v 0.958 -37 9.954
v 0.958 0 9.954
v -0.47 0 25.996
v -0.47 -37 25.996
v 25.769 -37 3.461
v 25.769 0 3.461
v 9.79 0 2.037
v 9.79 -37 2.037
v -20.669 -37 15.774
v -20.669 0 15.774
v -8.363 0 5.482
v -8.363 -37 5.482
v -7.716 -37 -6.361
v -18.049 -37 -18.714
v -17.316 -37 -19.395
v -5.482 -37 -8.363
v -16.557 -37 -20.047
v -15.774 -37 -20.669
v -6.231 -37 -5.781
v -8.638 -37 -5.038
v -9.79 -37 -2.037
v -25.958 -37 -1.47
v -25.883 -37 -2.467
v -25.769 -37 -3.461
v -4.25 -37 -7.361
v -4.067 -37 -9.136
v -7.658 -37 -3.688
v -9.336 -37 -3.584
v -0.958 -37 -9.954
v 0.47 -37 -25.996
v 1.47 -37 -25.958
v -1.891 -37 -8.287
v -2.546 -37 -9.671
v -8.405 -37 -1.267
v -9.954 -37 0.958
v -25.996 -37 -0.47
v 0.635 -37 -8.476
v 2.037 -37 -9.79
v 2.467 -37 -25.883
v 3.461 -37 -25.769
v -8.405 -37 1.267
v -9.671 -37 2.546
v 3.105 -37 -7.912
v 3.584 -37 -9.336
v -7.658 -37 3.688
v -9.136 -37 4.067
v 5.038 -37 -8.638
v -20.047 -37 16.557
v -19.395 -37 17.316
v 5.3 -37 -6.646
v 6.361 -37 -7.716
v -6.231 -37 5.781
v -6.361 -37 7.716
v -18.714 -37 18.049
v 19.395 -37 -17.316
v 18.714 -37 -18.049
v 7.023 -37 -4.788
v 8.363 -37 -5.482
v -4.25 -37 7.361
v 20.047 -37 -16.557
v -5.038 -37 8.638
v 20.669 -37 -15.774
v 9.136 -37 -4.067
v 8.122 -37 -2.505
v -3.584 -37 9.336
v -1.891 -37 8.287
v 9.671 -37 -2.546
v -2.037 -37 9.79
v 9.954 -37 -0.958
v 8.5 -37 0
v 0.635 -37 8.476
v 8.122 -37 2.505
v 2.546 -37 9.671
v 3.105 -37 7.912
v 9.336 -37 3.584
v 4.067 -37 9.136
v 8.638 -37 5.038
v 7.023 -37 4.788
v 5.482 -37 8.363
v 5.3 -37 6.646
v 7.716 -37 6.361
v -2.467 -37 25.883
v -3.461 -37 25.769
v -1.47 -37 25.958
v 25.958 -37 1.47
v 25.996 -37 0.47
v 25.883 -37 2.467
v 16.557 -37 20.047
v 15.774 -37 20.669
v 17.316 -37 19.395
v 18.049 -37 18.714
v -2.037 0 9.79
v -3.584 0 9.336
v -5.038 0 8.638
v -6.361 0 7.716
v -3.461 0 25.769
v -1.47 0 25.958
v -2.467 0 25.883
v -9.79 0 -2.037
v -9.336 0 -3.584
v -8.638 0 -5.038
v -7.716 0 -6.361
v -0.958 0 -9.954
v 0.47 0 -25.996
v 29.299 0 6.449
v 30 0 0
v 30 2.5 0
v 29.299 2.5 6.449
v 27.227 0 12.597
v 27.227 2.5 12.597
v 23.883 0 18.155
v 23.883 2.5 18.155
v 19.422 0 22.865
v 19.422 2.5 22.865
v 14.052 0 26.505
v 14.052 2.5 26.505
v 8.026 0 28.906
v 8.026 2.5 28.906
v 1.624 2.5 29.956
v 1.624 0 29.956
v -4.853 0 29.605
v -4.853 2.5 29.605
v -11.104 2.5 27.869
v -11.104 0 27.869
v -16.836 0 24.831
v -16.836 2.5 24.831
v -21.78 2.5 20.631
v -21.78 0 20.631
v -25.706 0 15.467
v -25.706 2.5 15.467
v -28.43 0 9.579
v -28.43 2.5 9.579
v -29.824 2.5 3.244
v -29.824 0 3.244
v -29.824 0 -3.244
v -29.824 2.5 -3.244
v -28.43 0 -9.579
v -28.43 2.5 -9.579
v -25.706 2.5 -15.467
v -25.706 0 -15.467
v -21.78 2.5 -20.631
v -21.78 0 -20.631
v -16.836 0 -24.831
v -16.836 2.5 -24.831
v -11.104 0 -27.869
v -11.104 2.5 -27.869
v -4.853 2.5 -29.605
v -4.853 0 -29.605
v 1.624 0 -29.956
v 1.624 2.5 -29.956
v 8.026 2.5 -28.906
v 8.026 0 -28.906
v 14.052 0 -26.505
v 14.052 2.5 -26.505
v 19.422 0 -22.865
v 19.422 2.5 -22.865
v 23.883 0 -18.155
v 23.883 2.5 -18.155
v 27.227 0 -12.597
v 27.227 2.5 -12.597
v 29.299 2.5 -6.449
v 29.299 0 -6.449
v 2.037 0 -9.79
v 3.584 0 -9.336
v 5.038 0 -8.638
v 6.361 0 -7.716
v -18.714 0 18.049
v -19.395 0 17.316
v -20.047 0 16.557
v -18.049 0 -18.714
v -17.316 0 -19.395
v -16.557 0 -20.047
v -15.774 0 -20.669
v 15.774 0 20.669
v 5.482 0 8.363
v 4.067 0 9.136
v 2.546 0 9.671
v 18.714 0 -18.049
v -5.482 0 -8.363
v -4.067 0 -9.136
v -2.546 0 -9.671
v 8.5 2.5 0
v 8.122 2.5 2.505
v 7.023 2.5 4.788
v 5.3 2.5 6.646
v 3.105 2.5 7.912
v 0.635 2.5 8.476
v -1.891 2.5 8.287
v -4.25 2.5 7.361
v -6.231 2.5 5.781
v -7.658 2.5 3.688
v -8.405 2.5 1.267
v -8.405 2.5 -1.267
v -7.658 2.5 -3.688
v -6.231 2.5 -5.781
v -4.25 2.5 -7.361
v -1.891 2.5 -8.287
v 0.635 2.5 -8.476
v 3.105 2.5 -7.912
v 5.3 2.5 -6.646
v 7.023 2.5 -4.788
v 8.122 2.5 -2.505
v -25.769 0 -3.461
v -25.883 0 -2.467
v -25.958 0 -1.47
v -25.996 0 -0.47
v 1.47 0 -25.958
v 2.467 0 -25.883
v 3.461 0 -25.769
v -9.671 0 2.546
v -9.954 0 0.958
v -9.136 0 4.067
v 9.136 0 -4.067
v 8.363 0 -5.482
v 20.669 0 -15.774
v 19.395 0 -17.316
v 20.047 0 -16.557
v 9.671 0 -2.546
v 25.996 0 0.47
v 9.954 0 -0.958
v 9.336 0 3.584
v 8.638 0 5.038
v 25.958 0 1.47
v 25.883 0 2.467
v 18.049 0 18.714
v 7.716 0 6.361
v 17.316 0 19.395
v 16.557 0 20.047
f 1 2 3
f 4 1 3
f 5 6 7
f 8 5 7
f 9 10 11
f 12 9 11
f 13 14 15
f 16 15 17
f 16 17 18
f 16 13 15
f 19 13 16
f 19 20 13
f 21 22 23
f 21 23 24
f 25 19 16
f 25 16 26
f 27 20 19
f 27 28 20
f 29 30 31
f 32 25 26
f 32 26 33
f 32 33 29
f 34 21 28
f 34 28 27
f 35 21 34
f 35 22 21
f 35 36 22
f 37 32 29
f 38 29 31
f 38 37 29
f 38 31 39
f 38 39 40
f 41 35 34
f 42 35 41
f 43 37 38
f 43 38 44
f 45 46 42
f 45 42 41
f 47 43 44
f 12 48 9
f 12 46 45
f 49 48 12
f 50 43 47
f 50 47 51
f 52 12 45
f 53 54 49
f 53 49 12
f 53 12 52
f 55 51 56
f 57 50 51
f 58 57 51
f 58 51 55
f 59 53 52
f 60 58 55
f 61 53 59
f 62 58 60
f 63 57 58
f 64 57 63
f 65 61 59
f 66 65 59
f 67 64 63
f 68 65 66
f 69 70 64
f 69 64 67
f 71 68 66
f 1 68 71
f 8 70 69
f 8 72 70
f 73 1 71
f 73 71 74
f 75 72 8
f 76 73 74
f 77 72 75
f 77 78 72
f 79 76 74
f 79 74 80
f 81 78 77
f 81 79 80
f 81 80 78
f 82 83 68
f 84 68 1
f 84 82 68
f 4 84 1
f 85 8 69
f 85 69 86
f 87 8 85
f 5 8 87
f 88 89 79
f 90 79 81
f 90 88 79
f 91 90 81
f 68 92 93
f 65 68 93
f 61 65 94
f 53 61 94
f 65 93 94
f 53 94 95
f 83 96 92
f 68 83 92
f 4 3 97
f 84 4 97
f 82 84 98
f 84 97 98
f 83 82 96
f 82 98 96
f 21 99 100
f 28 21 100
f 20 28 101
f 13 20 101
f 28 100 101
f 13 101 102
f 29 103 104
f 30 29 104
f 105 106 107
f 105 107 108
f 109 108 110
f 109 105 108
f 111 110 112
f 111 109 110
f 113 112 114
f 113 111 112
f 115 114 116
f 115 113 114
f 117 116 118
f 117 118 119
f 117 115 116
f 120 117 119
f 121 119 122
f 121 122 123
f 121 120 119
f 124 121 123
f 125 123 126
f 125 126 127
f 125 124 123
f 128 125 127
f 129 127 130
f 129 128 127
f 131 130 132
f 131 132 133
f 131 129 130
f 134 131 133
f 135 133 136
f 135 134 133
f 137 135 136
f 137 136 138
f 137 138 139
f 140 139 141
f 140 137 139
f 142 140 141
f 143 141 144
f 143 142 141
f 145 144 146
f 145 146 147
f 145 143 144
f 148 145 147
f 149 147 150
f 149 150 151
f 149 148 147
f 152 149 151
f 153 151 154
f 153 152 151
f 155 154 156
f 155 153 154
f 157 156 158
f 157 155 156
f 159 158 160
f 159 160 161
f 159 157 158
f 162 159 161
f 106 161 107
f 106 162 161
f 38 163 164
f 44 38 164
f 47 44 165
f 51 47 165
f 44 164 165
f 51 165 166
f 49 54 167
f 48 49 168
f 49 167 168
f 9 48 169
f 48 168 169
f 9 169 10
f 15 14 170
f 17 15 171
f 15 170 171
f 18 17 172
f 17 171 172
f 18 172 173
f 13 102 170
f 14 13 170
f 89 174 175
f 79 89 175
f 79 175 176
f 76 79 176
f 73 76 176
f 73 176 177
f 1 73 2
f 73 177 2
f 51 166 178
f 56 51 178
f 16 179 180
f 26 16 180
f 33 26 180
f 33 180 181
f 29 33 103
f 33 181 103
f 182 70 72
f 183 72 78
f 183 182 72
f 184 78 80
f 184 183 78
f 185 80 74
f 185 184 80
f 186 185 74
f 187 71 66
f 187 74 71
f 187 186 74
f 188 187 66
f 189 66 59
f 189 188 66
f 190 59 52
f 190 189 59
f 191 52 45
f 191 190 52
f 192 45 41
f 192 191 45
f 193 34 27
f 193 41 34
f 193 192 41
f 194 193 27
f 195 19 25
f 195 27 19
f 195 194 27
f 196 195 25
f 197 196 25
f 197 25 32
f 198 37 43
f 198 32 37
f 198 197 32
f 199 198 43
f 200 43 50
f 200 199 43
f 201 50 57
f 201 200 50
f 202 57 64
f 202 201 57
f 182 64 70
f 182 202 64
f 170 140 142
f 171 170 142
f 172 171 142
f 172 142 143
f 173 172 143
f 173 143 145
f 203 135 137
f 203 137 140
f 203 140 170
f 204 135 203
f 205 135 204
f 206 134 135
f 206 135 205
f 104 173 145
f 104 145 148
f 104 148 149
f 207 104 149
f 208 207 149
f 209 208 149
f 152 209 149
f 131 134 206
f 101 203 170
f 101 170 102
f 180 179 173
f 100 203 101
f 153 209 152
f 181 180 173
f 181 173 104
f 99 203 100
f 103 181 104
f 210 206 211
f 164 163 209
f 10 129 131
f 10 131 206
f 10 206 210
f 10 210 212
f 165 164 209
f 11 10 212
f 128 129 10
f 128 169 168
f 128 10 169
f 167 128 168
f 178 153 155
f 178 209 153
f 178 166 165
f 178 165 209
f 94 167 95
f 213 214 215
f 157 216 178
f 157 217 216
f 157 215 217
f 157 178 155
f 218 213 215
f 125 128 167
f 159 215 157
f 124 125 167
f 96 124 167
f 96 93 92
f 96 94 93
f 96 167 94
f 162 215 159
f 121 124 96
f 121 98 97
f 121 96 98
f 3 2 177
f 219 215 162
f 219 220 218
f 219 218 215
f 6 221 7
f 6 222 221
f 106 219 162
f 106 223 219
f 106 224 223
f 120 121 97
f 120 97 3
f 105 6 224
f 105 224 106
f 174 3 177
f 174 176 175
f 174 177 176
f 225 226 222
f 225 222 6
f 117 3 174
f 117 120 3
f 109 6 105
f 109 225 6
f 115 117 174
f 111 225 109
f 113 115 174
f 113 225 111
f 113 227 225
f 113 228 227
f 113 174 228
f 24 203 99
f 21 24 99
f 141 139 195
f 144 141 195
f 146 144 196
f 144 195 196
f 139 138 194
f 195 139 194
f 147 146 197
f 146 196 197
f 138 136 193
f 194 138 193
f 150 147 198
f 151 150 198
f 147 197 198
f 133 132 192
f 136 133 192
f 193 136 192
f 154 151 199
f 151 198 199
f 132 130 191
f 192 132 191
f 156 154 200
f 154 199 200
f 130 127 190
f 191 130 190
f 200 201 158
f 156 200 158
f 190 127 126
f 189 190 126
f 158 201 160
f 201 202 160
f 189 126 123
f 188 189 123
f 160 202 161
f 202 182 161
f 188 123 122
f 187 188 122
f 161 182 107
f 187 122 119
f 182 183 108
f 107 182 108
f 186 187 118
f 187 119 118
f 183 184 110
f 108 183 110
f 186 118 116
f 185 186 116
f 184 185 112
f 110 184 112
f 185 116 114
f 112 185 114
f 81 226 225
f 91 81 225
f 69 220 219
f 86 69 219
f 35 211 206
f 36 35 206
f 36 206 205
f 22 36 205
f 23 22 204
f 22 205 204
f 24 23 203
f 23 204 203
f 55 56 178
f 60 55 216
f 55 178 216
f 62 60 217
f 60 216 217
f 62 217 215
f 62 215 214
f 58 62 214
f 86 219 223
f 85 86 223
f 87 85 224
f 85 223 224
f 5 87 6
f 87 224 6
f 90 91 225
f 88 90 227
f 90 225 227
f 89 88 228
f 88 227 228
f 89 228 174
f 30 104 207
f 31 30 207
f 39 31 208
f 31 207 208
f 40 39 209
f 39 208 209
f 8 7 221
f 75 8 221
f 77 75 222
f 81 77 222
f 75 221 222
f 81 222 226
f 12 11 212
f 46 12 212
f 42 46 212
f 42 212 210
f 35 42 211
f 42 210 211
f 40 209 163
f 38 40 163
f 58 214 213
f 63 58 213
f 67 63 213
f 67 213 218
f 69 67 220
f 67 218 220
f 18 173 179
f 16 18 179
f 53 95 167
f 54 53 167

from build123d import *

# Parameters (mm, degrees)
F0_R     = 30
F0_R_2   = 8.5
F1_DEPTH = 2.5
F3_DEPTH = 37
F4_DEPTH = 40


with BuildPart() as f1:
    # F0 (on Front) → F1 (new body)
    with BuildSketch(Plane.XZ):
        Circle(F0_R)
        Circle(F0_R_2, mode=Mode.SUBTRACT)
    extrude(amount=-F1_DEPTH)

    # F2 (on Front) → F3 (join)
    with BuildSketch(Plane.XZ):
        with BuildLine():
            ThreePointArc((9.9539621754, -0.9584555339), (9.9884839128, -0.4797802861), (10, 0))
            ThreePointArc((10, 0), (9.9474412154, 1.0239205366), (9.790317347, 2.0370778693))
            ThreePointArc((9.790317347, 2.0370778693), (9.0162927853, 4.3250970404), (7.7162445614, 6.3607837464))
            ThreePointArc((7.7162445614, 6.3607837464), (6.6748253827, 7.4462545021), (5.4823682108, 8.3632313612))
            ThreePointArc((5.4823682108, 8.3632313612), (3.3171763231, 9.4337872163), (0.9584555339, 9.9539621754))
            ThreePointArc((0.9584555339, 9.9539621754), (-0.5454827615, 9.9851113442), (-2.0370778693, 9.790317347))
            ThreePointArc((-2.0370778693, 9.790317347), (-4.3250970404, 9.0162927853), (-6.3607837464, 7.7162445614))
            ThreePointArc((-6.3607837464, 7.7162445614), (-7.4462545021, 6.6748253827), (-8.3632313612, 5.4823682108))
            ThreePointArc((-8.3632313612, 5.4823682108), (-9.4337872163, 3.3171763231), (-9.9539621754, 0.9584555339))
            ThreePointArc((-9.9539621754, 0.9584555339), (-9.9851113442, -0.5454827615), (-9.790317347, -2.0370778693))
            ThreePointArc((-9.790317347, -2.0370778693), (-9.0162927853, -4.3250970404), (-7.7162445614, -6.3607837464))
            ThreePointArc((-7.7162445614, -6.3607837464), (-6.6748253827, -7.4462545021), (-5.4823682108, -8.3632313612))
            ThreePointArc((-5.4823682108, -8.3632313612), (-3.3171763231, -9.4337872163), (-0.9584555339, -9.9539621754))
            ThreePointArc((-0.9584555339, -9.9539621754), (0.5454827615, -9.9851113442), (2.0370778693, -9.790317347))
            ThreePointArc((2.0370778693, -9.790317347), (4.3250970404, -9.0162927853), (6.3607837464, -7.7162445614))
            ThreePointArc((6.3607837464, -7.7162445614), (7.4462545021, -6.6748253827), (8.3632313612, -5.4823682108))
            ThreePointArc((8.3632313612, -5.4823682108), (9.4337872163, -3.3171763231), (9.9539621754, -0.9584555339))
        make_face()
        with BuildLine():
            ThreePointArc((-8.3632313612, 5.4823682108), (-7.4462545021, 6.6748253827), (-6.3607837464, 7.7162445614))
            Line((-6.3607837464, 7.7162445614), (-18.7140811189, 18.0494644761))
            ThreePointArc((-18.7140811189, 18.0494644761), (-19.7242264231, 16.9397429736), (-20.6686668466, 15.7735921965))
            Line((-20.6686668466, 15.7735921965), (-8.3632313612, 5.4823682108))
        make_face()
        with BuildLine():
            Line((-15.7735921965, -20.6686668466), (-5.4823682108, -8.3632313612))
            ThreePointArc((-5.4823682108, -8.3632313612), (-6.6748253827, -7.4462545021), (-7.7162445614, -6.3607837464))
            Line((-7.7162445614, -6.3607837464), (-18.0494644761, -18.7140811189))
            ThreePointArc((-18.0494644761, -18.7140811189), (-16.9397429736, -19.7242264231), (-15.7735921965, -20.6686668466))
        make_face()
        with BuildLine():
            Line((3.4613404795, -25.7685684912), (2.0370778693, -9.790317347))
            ThreePointArc((2.0370778693, -9.790317347), (0.5454827615, -9.9851113442), (-0.9584555339, -9.9539621754))
            Line((-0.9584555339, -9.9539621754), (0.469954935, -25.9957523907))
            ThreePointArc((0.469954935, -25.9957523907), (1.9689271292, -25.9253413856), (3.4613404795, -25.7685684912))
        make_face()
        with BuildLine():
            Line((20.6686668466, -15.7735921965), (8.3632313612, -5.4823682108))
            ThreePointArc((8.3632313612, -5.4823682108), (7.4462545021, -6.6748253827), (6.3607837464, -7.7162445614))
            Line((6.3607837464, -7.7162445614), (18.7140811189, -18.0494644761))
            ThreePointArc((18.7140811189, -18.0494644761), (19.7242264231, -16.9397429736), (20.6686668466, -15.7735921965))
        make_face()
        with BuildLine():
            ThreePointArc((9.790317347, 2.0370778693), (9.9474412154, 1.0239205366), (10, 0))
            ThreePointArc((10, 0), (9.9884839128, -0.4797802861), (9.9539621754, -0.9584555339))
            Line((9.9539621754, -0.9584555339), (25.9957523907, 0.469954935))
            ThreePointArc((25.9957523907, 0.469954935), (25.9253413856, 1.9689271292), (25.7685684912, 3.4613404795))
            Line((25.7685684912, 3.4613404795), (9.790317347, 2.0370778693))
        make_face()
        with BuildLine():
            ThreePointArc((5.4823682108, 8.3632313612), (6.6748253827, 7.4462545021), (7.7162445614, 6.3607837464))
            Line((7.7162445614, 6.3607837464), (18.0494644761, 18.7140811189))
            ThreePointArc((18.0494644761, 18.7140811189), (16.9397429736, 19.7242264231), (15.7735921965, 20.6686668466))
            Line((15.7735921965, 20.6686668466), (5.4823682108, 8.3632313612))
        make_face()
        with BuildLine():
            ThreePointArc((-2.0370778693, 9.790317347), (-0.5454827615, 9.9851113442), (0.9584555339, 9.9539621754))
            Line((0.9584555339, 9.9539621754), (-0.469954935, 25.9957523907))
            ThreePointArc((-0.469954935, 25.9957523907), (-1.9689271292, 25.9253413856), (-3.4613404795, 25.7685684912))
            Line((-3.4613404795, 25.7685684912), (-2.0370778693, 9.790317347))
        make_face()
        with BuildLine():
            ThreePointArc((-9.790317347, -2.0370778693), (-9.9851113442, -0.5454827615), (-9.9539621754, 0.9584555339))
            Line((-9.9539621754, 0.9584555339), (-25.9957523907, -0.469954935))
            ThreePointArc((-25.9957523907, -0.469954935), (-25.9253413856, -1.9689271292), (-25.7685684912, -3.4613404795))
            Line((-25.7685684912, -3.4613404795), (-9.790317347, -2.0370778693))
        make_face()
    extrude(amount=F3_DEPTH)

    # F4 (cut): a face of the model
    f4_faces = [f1.faces().sort_by_distance(p)[0] for p in [
        (0, 0, 0),
    ]]
    extrude(f4_faces, amount=-F4_DEPTH, mode=Mode.SUBTRACT)


solid = f1.part
